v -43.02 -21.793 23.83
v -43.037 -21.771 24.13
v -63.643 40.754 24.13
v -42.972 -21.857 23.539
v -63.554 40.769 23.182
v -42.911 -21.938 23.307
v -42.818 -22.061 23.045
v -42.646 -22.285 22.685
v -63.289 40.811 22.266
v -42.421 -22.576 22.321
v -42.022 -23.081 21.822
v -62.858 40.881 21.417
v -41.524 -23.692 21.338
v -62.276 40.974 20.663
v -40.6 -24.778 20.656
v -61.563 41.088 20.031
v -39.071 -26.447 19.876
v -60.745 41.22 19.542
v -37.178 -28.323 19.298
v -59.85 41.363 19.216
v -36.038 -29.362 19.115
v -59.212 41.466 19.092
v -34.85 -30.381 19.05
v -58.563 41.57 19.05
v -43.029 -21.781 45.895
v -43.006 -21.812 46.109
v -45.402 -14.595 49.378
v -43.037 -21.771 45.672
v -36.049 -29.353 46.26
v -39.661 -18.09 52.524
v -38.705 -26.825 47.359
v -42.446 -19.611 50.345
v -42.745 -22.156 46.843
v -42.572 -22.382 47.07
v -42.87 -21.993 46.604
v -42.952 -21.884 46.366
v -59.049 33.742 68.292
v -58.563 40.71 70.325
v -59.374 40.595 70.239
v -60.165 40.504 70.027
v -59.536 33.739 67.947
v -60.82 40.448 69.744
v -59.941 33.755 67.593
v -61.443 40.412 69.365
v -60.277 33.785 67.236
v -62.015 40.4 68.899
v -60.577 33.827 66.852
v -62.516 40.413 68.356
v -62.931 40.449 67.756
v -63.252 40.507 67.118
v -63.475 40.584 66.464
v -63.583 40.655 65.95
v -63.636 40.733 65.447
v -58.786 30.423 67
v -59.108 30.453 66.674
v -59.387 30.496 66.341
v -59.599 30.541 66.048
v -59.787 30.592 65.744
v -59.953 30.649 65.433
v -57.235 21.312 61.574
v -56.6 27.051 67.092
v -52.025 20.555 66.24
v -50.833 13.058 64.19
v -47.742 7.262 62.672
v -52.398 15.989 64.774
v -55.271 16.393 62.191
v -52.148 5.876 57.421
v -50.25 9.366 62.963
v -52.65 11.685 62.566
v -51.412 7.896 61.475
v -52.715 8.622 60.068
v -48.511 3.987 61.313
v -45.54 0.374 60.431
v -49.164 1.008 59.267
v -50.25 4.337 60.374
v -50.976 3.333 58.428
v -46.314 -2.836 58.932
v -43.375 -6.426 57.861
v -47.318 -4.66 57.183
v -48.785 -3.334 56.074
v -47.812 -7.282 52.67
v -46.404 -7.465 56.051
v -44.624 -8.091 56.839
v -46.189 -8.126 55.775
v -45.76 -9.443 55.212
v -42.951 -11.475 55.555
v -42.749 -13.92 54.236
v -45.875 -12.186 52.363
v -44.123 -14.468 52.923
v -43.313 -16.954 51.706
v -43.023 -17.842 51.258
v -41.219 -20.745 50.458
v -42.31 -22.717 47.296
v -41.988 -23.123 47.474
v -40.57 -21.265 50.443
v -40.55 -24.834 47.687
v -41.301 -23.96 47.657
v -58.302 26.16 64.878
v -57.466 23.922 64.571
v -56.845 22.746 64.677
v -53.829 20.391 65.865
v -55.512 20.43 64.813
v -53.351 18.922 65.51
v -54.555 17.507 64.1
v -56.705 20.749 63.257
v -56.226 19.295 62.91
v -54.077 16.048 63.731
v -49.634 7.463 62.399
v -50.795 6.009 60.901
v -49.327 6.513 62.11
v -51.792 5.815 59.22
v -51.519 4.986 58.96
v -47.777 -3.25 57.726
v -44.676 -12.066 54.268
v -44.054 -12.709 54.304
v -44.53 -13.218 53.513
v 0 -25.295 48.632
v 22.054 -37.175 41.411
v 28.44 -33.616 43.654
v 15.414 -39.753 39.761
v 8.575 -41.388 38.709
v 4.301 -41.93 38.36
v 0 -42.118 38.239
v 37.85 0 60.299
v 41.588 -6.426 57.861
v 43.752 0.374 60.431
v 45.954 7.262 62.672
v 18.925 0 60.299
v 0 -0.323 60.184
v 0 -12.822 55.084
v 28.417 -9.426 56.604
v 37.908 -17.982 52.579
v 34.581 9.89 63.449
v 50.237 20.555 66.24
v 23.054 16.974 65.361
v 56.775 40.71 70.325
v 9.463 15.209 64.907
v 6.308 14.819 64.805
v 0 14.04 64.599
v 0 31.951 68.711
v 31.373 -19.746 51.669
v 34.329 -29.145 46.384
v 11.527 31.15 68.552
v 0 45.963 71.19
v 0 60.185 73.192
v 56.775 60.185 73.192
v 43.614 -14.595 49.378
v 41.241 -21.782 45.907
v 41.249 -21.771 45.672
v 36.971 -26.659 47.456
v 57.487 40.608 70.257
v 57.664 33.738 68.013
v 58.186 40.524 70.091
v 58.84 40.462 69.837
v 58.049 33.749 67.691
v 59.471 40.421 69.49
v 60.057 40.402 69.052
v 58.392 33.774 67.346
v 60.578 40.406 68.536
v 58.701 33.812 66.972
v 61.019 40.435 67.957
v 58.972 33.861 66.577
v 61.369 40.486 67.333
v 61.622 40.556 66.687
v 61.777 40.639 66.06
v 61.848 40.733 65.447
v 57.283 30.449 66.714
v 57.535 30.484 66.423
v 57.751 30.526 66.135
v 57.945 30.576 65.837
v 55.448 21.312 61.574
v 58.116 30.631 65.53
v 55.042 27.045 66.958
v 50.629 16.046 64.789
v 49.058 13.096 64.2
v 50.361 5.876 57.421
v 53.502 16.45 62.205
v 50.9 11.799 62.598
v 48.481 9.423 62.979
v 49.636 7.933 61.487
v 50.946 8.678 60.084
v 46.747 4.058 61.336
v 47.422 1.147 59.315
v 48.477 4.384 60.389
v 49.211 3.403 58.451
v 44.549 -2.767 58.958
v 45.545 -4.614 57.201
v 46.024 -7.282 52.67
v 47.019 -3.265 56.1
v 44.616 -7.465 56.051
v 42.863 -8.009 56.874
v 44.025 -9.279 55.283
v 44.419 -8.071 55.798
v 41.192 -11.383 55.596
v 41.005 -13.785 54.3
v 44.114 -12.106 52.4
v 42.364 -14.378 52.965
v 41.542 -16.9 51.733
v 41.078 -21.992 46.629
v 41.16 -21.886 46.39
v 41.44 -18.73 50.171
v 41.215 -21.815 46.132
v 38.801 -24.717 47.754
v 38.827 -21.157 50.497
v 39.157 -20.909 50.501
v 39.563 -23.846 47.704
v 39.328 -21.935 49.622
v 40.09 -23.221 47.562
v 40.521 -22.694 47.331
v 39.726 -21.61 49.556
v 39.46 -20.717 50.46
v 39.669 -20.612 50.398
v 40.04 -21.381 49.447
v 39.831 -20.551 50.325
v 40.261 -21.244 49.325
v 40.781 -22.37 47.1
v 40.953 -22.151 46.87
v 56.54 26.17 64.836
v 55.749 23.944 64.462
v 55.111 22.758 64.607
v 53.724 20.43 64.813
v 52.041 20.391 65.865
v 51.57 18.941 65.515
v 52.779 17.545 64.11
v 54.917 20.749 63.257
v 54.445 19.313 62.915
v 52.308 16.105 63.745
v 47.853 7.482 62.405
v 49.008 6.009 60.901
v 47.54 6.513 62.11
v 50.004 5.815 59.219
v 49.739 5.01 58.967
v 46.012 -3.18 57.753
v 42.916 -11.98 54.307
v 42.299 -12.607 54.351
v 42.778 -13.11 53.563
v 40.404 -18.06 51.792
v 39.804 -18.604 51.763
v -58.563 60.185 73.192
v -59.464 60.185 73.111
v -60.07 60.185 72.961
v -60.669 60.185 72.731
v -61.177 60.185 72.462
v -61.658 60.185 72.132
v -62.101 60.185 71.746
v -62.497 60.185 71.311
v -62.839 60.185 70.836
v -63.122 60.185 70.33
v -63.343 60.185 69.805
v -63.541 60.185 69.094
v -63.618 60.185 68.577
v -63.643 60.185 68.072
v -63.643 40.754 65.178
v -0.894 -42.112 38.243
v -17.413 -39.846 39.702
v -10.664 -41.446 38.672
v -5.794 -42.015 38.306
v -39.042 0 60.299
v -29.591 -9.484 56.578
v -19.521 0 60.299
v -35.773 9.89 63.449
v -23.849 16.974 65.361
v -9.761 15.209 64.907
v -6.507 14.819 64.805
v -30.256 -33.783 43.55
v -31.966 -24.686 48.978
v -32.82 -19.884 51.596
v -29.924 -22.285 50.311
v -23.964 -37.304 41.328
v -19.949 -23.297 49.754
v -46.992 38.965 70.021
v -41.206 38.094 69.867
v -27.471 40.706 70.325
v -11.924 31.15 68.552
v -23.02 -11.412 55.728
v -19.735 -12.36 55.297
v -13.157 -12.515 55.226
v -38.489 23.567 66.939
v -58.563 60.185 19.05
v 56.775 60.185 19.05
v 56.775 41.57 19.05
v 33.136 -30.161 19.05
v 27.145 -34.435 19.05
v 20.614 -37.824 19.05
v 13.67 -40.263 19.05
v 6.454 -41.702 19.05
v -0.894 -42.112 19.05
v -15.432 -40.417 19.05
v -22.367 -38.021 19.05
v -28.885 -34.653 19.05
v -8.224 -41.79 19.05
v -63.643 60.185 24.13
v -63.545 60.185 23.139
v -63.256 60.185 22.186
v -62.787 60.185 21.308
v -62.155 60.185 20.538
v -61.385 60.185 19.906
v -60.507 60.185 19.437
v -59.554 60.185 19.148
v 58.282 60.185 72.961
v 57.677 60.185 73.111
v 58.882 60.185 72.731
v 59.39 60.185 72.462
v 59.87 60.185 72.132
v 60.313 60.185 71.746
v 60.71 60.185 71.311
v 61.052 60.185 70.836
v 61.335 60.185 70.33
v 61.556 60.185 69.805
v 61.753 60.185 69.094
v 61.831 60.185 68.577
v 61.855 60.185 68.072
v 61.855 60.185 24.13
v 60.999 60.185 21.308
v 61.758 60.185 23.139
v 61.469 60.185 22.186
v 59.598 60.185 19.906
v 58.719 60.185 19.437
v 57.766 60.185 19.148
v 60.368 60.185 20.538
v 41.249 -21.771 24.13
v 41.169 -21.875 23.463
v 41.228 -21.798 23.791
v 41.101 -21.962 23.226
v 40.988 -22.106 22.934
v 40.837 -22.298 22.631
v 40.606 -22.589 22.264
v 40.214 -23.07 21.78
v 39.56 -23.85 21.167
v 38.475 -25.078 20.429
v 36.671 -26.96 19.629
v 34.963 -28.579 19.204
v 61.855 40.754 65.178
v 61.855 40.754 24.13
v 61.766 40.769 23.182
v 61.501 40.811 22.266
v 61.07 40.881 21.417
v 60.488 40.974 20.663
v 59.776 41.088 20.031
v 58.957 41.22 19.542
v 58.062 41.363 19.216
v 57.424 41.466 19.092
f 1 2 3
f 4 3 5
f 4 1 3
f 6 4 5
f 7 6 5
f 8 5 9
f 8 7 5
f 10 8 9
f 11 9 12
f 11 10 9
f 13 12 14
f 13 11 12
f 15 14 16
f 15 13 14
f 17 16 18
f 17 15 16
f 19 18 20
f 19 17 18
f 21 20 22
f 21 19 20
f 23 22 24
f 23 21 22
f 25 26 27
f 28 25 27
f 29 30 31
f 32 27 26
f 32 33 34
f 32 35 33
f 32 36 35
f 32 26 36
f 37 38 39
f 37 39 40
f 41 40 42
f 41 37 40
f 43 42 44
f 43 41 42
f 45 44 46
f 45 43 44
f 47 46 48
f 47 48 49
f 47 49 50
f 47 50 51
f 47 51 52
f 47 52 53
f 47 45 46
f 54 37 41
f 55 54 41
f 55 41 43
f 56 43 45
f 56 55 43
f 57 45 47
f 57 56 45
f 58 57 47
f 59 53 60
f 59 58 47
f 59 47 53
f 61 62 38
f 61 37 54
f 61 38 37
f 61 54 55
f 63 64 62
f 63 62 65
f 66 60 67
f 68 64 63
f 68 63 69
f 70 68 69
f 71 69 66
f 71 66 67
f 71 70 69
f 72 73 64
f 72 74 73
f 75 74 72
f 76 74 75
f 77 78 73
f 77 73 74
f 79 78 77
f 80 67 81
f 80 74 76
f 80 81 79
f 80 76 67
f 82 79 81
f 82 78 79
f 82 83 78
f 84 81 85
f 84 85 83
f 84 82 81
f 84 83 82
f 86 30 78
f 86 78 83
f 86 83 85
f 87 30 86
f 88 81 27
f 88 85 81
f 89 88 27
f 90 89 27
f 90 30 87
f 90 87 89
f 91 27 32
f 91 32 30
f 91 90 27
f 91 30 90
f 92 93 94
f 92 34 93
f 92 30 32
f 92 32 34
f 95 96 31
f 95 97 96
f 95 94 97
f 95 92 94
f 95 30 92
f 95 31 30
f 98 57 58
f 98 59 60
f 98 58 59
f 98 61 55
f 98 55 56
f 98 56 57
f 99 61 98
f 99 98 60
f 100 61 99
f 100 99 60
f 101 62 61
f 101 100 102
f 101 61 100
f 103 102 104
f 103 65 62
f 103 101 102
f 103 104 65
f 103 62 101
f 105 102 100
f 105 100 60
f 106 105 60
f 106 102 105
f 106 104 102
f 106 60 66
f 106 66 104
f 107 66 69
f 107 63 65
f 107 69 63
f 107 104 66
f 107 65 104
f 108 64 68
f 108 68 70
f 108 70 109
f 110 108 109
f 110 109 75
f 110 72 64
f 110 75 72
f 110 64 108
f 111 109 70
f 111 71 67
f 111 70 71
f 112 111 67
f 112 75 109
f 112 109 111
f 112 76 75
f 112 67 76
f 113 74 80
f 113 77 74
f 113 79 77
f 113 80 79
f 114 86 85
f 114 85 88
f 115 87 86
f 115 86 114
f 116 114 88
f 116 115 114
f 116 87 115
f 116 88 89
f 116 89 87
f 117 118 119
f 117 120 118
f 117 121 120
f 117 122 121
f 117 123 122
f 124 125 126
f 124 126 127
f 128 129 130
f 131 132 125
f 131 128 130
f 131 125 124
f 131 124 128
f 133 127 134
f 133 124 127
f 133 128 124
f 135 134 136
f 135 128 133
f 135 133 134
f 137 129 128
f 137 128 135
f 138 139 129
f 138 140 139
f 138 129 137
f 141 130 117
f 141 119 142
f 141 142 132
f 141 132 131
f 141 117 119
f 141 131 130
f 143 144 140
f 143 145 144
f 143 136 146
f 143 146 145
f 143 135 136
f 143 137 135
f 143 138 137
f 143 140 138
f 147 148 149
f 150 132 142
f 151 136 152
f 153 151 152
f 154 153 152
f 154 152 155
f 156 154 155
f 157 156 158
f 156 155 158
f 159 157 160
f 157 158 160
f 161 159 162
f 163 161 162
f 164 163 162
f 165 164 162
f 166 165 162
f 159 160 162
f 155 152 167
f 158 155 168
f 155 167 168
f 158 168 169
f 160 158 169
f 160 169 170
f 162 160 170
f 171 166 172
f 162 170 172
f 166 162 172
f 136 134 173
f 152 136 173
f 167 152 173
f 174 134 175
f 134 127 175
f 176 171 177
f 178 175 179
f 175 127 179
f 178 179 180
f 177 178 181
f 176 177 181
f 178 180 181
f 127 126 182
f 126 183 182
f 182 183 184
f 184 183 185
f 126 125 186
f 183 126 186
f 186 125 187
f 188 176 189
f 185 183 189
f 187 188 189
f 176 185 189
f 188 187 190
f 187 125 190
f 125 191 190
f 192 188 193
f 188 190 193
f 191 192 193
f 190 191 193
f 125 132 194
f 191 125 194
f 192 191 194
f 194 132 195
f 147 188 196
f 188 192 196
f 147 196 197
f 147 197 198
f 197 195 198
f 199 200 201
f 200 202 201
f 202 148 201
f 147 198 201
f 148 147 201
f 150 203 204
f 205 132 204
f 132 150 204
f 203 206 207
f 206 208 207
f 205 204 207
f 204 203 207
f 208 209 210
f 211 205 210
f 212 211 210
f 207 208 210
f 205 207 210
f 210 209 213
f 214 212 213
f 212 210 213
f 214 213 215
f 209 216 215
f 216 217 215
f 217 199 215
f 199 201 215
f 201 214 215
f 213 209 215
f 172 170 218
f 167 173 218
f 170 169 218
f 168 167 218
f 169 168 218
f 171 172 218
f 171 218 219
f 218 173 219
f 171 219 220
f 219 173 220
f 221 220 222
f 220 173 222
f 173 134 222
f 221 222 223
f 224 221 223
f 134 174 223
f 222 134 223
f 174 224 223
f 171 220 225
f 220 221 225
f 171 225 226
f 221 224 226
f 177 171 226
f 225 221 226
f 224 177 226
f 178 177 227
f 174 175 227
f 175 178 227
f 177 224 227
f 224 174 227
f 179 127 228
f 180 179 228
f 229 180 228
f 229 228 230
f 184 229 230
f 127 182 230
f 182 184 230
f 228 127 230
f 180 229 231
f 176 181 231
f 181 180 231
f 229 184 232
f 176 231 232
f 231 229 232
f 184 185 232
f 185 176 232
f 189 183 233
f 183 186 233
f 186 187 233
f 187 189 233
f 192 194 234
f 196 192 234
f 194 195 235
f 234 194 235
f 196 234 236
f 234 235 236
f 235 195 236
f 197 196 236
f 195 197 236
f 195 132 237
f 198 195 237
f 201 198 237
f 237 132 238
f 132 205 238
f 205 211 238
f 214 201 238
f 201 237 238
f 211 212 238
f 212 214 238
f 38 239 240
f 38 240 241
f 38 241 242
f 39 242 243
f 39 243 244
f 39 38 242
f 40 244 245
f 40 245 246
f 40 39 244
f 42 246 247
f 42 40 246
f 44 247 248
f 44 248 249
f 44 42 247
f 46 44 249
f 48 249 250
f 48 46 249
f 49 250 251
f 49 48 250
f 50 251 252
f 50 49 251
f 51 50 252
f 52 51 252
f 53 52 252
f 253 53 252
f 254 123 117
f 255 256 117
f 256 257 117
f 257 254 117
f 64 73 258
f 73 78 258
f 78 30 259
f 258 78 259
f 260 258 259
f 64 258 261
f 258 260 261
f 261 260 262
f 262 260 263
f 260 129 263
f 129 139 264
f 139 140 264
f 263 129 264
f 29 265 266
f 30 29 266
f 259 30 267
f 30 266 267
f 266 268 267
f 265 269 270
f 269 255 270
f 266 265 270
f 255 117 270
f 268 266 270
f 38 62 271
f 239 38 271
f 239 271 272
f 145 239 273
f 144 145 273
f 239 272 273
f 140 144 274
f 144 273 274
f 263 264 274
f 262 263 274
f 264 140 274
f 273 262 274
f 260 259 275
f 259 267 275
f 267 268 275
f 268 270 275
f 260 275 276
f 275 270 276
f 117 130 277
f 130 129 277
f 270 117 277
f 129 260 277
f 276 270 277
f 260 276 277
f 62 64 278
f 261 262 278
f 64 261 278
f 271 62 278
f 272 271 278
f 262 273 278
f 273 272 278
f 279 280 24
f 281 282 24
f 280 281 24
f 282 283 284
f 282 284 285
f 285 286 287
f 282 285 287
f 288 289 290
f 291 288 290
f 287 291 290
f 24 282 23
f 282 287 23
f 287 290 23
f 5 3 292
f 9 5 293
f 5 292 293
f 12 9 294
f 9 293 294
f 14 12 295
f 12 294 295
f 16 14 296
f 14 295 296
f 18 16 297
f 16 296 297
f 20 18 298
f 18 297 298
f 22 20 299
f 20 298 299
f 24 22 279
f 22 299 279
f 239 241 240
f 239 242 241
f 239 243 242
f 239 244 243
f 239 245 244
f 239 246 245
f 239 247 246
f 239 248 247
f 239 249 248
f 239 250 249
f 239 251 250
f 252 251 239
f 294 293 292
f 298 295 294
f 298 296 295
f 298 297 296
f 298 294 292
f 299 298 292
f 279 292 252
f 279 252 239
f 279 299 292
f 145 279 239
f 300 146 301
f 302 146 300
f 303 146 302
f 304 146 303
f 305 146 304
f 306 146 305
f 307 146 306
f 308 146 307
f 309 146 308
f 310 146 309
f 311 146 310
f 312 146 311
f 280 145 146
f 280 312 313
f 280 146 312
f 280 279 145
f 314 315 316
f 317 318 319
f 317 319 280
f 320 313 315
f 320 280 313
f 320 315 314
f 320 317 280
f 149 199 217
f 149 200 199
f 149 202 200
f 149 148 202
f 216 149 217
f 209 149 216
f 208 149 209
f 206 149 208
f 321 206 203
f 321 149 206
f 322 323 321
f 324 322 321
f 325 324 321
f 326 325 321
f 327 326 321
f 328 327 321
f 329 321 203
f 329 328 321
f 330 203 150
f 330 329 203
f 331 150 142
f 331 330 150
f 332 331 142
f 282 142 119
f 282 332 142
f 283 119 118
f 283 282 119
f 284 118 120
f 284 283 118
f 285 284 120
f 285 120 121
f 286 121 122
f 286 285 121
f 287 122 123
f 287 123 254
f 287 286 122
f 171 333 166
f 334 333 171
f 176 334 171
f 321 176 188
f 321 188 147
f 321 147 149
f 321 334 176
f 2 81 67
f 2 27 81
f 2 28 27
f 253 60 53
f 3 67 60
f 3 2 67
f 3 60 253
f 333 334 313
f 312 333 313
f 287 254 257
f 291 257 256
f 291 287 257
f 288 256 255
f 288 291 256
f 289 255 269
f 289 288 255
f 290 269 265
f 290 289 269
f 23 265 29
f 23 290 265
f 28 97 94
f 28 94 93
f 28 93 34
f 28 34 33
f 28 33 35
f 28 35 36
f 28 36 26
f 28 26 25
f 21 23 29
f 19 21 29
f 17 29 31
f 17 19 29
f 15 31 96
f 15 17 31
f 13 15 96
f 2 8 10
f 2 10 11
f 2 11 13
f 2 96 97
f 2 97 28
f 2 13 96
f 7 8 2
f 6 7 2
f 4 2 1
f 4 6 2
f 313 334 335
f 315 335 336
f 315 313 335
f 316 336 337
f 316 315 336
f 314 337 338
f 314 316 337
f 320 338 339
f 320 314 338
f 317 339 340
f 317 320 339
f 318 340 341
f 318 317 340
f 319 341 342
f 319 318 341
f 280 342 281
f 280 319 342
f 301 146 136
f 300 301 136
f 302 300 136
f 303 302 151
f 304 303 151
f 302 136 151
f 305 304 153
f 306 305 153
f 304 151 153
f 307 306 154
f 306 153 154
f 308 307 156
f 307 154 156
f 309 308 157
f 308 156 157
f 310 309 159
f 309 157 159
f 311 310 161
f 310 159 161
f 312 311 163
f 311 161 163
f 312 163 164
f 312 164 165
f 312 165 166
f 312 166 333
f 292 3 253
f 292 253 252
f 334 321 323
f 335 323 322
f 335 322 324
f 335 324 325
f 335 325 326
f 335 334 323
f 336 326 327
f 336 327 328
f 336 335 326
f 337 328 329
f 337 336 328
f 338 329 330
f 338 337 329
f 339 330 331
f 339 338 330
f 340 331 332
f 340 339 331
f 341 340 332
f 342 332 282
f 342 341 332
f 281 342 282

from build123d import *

# Parameters (mm, degrees)
F0_W     = 84.2862705333
F0_H     = 62.5252984464
F1_DEPTH = 38.1
F2_DEPTH = 19.431
F4_DEPTH = 76.2
F5_DEPTH = 50.8
F6_DEPTH = 19.05
F7_R     = 5.08


with BuildPart() as f1:
    # F0 (on Top) → F1 (new body)
    with BuildSketch(Plane.XY):
        with Locations((-0.8938079051, 9.4918403774)):
            Rectangle(F0_W, F0_H)
        Polygon((61.8553981185, 40.7544896007), (41.2493273616, 40.7544896007), (41.2493273616, -21.7708088458), align=None)
        Polygon((-43.0369431717, -21.7708088458), (-43.0369431717, 40.7544896007), (-63.6430233717, 40.7544896007), align=None)
        with BuildLine():
            Line((41.2493273616, -21.7708088458), (-43.0369431717, -21.7708088458))
            ThreePointArc((-43.0369431717, -21.7708088458), (-24.4435818385, -37.0758276989), (-0.8938079051, -42.1121791005))
            ThreePointArc((-0.8938079051, -42.1121791005), (22.5826118494, -36.9238529276), (41.2493273616, -21.7708088458))
        make_face()
    extrude(amount=F1_DEPTH)

    # F2 (add): a face of the model
    f2_faces = [f1.faces().sort_by_distance(p)[0] for p in [
        (-0.8938126266, 40.7544896007, 19.05),
    ]]
    extrude(f2_faces, amount=F2_DEPTH)

    # F3 (on Right) → F4 (join, symmetric)
    with BuildSketch(Plane.YZ):
        with BuildLine():
            add(Edge.make_bspline(
                [(-42.3909127712, 38.0631349981), (-29.9156566507, 46.1025365559), (-0.9292461645, 64.7821826505), (83.4228372852, 77.6600402112), (128.7347014113, 77.0774025905), (150.1817703247, 76.8016278744)],
                knots=[0, 0, 0, 0, 0.2846618796, 0.6614152802, 1, 1, 1, 1], degree=3))
            Line((-42.3909127712, 38.0631349981), (150.1817703247, 38.0631349981))
            Line((150.1817703247, 38.0631349981), (150.1817703247, 76.8016278744))
        make_face()
    extrude(amount=F4_DEPTH, both=True)

    # F5 (cut): a face of the model
    f5_faces = [f1.faces().sort_by_distance(p)[0] for p in [
        (0.4832953146, 74.166117784, 38.0631349981),
    ]]
    extrude(f5_faces, amount=-F5_DEPTH, mode=Mode.SUBTRACT)

    # F6 (cut): a face of the model
    f6_faces = [f1.faces().sort_by_distance(p)[0] for p in [
        (-0.9060877903, 15.8917005053, 0),
    ]]
    extrude(f6_faces, amount=-F6_DEPTH, mode=Mode.SUBTRACT)

    # F7
    f7_edges = [f1.edges().sort_by_distance(p)[0] for p in [
        (-53.339983, 9.49184, 19.05),
        (51.552363, 9.49184, 19.05),
        (51.296645, 8.715914, 63.106757),
        (0, 6.644686, 62.484239),
        (61.855398, 50.46999, 19.05),
        (-63.643023, 50.46999, 19.05),
        (61.855398, 50.453515, 71.874141),
        (-63.643023, 50.453515, 71.874141),
        (-53.105319, 8.779795, 63.12556),
    ]]
    fillet(f7_edges, radius=F7_R)


solid = f1.part
